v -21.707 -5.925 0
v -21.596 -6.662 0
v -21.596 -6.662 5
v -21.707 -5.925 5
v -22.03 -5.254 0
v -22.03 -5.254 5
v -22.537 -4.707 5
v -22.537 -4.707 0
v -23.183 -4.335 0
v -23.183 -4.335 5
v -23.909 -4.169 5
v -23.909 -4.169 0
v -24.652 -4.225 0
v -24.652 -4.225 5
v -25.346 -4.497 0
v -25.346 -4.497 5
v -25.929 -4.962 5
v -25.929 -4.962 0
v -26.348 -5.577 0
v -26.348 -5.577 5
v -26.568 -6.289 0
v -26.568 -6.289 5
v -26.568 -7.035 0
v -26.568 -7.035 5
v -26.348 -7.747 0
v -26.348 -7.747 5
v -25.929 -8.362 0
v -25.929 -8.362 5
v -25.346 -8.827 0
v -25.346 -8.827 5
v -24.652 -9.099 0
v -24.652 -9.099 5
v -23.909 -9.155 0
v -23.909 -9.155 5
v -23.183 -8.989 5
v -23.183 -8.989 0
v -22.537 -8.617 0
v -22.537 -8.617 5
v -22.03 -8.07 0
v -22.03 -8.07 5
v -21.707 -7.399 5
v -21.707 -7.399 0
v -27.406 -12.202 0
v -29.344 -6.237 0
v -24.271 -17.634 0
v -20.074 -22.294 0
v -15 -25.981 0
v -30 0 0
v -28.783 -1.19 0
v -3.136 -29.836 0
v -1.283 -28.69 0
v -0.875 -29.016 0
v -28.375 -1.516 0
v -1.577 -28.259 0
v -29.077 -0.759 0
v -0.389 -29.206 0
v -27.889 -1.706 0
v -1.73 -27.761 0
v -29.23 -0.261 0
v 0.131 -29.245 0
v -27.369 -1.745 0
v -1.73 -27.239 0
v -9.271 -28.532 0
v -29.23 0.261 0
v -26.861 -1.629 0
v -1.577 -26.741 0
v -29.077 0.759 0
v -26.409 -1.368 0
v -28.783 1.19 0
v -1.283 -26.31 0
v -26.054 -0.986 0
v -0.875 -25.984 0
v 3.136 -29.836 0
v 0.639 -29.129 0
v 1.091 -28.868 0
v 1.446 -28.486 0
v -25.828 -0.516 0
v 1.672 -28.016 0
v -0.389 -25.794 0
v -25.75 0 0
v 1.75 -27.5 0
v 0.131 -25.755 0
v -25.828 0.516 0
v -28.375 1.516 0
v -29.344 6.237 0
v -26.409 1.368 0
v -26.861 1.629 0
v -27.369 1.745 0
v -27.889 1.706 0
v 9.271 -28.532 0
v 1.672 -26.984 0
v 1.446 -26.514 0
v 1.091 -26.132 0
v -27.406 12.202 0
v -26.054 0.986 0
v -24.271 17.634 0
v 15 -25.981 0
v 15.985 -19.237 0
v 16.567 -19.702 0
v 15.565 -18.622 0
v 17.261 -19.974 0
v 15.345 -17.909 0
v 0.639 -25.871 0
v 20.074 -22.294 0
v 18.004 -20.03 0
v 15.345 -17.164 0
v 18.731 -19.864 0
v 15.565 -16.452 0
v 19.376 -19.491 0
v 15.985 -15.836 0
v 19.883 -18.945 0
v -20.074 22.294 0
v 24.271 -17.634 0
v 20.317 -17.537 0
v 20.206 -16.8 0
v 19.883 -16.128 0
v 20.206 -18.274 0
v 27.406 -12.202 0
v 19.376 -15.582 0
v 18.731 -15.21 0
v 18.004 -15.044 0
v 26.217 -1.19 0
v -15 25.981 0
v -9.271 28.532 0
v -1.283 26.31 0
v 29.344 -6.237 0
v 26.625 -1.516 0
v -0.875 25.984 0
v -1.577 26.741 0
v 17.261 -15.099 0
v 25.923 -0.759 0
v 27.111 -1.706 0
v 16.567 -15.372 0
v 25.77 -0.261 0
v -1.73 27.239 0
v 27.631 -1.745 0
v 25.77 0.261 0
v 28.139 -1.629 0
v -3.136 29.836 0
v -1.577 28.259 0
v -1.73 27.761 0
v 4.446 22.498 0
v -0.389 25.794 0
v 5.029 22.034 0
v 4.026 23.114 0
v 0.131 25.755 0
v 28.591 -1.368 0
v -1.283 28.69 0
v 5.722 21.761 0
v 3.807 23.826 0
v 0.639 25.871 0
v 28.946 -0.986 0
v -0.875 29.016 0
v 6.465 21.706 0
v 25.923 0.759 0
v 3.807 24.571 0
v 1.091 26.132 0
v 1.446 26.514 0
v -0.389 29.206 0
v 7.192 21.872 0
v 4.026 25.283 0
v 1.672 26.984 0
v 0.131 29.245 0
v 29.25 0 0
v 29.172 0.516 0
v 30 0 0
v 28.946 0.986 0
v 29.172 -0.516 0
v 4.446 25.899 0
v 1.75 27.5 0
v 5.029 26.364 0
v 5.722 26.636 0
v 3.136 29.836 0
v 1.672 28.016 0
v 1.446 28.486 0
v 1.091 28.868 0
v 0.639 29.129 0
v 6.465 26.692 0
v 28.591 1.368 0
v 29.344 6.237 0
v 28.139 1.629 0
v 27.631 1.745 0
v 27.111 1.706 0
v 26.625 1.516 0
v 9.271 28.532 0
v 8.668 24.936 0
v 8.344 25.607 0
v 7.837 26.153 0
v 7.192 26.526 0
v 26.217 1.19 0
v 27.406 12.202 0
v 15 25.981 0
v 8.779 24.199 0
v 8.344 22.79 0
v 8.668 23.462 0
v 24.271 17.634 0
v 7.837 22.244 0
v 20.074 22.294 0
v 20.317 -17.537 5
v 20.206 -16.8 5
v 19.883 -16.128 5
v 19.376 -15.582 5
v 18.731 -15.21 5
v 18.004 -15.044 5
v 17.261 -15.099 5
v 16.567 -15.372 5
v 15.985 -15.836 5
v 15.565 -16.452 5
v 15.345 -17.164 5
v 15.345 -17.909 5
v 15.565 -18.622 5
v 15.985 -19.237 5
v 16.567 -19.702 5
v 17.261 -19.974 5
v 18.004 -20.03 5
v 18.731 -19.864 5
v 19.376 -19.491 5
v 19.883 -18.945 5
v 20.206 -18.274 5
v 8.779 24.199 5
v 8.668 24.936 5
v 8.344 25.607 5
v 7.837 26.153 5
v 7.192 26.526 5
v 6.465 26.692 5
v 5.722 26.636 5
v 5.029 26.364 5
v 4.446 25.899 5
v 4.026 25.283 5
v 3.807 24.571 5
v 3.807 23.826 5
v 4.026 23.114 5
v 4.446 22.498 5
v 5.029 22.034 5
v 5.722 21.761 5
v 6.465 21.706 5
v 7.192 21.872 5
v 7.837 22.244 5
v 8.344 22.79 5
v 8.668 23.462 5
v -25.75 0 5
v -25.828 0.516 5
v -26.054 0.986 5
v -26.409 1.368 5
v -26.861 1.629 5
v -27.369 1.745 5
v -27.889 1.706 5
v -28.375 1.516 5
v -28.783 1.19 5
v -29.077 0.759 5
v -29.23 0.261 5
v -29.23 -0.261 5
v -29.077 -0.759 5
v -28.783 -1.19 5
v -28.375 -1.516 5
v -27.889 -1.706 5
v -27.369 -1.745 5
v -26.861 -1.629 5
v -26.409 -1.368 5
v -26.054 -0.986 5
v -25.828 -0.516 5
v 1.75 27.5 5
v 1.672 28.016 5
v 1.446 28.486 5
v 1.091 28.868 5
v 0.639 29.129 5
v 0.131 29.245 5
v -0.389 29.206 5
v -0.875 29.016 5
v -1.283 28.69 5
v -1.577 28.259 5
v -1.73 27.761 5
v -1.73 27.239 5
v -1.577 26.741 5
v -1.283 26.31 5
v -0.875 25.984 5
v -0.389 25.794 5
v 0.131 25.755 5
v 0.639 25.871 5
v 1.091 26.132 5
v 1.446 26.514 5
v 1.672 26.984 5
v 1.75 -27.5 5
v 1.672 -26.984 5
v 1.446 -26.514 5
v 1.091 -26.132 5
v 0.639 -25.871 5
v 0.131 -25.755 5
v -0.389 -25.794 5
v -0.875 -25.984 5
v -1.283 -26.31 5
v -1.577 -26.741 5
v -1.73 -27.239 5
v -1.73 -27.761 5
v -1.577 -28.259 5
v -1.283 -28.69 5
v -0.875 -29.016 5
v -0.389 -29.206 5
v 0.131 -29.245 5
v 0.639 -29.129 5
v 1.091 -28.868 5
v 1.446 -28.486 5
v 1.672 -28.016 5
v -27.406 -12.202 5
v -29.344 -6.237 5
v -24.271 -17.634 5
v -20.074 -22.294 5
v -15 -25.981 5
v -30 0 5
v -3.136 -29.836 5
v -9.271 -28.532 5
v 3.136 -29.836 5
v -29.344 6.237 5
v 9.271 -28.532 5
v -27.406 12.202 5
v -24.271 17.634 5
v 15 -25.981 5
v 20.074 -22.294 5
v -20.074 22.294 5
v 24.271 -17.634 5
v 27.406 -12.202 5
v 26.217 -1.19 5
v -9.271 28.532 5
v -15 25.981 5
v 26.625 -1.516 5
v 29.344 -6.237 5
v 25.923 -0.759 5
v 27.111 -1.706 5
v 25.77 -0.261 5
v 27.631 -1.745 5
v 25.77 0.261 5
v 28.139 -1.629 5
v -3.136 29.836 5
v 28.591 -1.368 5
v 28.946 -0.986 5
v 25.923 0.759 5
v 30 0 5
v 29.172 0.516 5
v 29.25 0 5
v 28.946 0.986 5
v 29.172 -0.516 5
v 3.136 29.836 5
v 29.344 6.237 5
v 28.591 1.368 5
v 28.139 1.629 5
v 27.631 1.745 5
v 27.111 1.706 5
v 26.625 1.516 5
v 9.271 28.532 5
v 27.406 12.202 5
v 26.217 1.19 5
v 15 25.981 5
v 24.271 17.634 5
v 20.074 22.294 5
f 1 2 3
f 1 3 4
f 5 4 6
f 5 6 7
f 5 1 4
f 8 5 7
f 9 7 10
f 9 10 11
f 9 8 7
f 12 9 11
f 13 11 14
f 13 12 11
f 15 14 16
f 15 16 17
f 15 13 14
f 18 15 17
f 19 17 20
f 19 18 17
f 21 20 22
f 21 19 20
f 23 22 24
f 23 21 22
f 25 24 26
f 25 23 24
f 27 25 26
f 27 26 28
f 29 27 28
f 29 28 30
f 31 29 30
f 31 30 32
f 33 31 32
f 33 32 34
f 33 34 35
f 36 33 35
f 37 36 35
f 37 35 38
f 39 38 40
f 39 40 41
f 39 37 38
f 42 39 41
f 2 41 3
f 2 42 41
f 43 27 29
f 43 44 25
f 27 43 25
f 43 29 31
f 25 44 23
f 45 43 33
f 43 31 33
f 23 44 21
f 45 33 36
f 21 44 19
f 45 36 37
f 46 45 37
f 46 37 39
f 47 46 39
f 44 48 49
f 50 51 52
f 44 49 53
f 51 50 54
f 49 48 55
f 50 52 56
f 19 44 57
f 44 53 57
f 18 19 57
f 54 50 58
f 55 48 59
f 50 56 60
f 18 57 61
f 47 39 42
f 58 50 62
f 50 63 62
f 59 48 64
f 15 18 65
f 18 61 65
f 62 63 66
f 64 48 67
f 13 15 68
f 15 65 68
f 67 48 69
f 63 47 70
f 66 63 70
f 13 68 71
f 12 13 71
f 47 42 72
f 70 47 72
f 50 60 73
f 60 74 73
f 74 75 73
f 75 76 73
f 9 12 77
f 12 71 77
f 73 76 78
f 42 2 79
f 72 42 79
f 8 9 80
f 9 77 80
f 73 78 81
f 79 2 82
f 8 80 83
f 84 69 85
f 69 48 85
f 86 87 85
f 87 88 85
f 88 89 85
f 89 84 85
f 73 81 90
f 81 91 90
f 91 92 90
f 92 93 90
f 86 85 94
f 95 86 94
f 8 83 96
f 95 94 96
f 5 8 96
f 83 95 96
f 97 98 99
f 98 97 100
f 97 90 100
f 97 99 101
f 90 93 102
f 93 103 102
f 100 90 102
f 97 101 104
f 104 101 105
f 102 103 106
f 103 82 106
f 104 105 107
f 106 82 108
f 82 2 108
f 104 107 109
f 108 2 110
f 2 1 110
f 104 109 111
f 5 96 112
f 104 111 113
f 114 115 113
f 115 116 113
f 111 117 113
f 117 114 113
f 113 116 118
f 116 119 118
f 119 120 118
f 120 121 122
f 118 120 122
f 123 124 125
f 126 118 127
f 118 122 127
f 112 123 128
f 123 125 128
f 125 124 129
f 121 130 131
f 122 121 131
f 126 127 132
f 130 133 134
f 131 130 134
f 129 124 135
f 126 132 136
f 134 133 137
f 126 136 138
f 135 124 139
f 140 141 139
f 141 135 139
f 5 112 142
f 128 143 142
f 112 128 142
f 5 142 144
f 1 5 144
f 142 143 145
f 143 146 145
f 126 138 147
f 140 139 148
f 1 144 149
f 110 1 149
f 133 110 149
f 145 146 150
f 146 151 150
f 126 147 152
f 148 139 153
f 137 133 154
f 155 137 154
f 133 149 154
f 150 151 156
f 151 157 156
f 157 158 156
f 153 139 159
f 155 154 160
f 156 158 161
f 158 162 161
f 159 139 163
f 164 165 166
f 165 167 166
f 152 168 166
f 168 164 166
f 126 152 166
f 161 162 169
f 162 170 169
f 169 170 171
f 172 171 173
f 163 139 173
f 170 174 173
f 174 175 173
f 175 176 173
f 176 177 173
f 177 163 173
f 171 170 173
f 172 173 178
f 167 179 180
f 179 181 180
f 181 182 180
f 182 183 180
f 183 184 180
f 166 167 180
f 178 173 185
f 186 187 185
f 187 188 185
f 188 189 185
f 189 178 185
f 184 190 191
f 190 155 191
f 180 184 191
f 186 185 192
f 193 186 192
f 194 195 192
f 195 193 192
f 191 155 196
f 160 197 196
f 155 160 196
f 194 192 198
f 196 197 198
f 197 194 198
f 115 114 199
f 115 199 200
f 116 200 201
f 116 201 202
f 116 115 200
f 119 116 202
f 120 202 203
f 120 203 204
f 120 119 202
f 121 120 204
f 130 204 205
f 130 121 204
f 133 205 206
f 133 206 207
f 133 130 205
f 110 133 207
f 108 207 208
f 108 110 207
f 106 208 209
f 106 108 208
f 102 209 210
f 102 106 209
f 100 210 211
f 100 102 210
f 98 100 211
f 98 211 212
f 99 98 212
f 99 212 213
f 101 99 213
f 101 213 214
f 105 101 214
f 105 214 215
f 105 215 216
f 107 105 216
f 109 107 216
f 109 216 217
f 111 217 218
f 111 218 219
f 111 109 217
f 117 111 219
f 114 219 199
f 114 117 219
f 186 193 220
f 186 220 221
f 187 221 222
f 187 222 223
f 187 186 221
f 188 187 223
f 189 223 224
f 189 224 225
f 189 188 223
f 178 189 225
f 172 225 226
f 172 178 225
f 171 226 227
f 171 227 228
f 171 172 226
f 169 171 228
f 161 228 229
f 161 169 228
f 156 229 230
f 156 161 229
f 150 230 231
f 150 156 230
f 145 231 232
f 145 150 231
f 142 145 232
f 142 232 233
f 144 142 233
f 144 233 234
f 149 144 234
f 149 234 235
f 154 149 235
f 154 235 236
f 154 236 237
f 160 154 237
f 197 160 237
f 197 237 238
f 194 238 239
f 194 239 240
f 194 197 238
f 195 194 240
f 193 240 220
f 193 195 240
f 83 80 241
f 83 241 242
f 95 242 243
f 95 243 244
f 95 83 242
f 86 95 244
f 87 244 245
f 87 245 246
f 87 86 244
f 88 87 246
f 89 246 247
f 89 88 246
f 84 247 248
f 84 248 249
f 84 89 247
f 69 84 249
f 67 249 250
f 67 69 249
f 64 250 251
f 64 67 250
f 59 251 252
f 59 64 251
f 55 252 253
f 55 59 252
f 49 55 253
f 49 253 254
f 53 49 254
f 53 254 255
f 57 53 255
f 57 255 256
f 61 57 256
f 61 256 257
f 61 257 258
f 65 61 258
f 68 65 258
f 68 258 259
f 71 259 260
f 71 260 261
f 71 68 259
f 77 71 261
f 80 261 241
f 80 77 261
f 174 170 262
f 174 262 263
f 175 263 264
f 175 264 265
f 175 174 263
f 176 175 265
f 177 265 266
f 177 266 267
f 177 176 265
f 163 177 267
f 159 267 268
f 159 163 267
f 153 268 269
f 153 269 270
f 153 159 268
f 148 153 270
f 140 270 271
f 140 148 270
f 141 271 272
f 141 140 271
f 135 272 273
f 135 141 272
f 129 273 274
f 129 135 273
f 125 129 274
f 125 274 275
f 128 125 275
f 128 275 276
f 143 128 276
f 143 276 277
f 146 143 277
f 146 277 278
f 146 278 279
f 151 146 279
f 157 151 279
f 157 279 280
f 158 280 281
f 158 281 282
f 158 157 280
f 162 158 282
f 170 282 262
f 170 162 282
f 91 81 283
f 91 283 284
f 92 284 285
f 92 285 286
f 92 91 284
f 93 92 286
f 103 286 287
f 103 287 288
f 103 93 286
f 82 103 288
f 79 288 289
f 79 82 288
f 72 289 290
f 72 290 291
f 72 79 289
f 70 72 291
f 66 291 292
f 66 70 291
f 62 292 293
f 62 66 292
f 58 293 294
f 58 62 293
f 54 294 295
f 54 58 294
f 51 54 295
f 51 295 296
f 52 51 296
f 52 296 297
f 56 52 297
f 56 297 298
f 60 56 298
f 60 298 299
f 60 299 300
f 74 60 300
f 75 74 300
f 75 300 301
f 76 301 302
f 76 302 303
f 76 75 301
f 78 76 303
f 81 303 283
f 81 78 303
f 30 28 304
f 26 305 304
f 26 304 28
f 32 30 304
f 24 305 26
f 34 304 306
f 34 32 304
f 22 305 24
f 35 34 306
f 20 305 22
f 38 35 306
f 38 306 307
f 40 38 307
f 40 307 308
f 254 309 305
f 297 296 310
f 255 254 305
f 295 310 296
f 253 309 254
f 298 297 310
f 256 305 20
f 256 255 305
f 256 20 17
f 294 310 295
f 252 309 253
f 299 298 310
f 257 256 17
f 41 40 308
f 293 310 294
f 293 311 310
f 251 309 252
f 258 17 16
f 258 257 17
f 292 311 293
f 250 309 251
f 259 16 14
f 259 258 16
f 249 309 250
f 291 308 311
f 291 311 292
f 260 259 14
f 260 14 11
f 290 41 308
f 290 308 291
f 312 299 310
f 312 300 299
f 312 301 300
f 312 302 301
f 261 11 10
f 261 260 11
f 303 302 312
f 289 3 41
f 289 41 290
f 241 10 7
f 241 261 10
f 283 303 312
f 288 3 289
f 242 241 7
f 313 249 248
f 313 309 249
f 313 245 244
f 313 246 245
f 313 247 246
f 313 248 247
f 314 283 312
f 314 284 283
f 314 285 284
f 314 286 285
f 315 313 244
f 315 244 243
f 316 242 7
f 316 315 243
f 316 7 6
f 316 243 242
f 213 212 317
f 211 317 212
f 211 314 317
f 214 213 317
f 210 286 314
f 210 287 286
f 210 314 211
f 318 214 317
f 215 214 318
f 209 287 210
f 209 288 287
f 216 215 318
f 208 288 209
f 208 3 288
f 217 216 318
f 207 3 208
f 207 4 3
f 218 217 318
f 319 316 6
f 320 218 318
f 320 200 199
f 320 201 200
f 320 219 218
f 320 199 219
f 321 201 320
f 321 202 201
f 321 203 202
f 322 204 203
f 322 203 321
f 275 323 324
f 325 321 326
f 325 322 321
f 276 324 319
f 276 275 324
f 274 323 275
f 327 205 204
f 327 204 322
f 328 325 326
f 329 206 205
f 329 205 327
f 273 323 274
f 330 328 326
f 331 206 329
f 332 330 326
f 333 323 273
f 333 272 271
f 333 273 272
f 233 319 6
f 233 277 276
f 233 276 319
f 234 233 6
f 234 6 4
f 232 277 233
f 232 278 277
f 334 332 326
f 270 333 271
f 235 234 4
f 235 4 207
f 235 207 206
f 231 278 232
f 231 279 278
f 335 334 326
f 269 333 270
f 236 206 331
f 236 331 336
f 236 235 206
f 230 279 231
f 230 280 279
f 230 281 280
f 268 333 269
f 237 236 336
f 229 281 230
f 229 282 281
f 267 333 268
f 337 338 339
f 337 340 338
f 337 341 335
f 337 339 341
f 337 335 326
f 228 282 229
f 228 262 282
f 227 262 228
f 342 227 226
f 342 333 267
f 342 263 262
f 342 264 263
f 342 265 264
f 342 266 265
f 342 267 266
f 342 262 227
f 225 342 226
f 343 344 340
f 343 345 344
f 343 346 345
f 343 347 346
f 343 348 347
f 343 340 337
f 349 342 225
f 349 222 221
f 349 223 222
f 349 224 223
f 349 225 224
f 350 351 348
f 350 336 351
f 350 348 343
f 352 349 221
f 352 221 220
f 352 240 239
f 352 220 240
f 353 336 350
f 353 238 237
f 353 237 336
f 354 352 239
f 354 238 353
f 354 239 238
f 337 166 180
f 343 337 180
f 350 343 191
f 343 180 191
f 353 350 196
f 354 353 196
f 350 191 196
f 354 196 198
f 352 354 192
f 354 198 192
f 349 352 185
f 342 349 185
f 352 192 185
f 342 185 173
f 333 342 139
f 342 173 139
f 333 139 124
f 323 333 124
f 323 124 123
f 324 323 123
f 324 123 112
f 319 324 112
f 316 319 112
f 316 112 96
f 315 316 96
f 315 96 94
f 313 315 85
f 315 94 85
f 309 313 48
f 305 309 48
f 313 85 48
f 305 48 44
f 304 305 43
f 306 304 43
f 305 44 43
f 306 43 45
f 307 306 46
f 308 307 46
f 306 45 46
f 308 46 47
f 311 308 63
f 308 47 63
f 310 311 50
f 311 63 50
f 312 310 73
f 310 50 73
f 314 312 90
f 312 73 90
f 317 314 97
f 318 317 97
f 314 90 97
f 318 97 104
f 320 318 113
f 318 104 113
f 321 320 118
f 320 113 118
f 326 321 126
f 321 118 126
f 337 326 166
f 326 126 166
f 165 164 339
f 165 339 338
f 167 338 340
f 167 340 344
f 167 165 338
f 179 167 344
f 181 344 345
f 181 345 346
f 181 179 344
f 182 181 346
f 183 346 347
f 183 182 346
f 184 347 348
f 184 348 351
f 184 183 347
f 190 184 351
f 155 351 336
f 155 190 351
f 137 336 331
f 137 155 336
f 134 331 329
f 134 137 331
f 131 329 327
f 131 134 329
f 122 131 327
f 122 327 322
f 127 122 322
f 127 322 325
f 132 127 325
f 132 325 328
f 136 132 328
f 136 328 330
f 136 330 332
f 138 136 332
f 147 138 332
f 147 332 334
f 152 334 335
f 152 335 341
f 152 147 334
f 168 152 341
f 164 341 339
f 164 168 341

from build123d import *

# Parameters (mm, degrees)
SKETCH1_R           = 30
SKETCH1_R_2         = 1.75
SKETCH1_R_3         = 2.5
BOSS_EXTRUDE1_DEPTH = 5


with BuildPart() as part:
    # Sketch1 → Boss-Extrude1 (new body)
    with BuildSketch(Plane.XY):
        Circle(SKETCH1_R)
        with Locations((0, 27.5)):
            Circle(SKETCH1_R_2, mode=Mode.SUBTRACT)
        with Locations((27.5, 0)):
            Circle(SKETCH1_R_2, mode=Mode.SUBTRACT)
        with Locations((0, -27.5)):
            Circle(SKETCH1_R_2, mode=Mode.SUBTRACT)
        with Locations((-27.5, 0)):
            Circle(SKETCH1_R_2, mode=Mode.SUBTRACT)
        with Locations((6.278593331, 24.198745128)):
            Circle(SKETCH1_R_3, mode=Mode.SUBTRACT)
        with Locations((17.817431356, -17.536793889)):
            Circle(SKETCH1_R_3, mode=Mode.SUBTRACT)
        with Locations((-24.096024686, -6.66195124)):
            Circle(SKETCH1_R_3, mode=Mode.SUBTRACT)
    extrude(amount=BOSS_EXTRUDE1_DEPTH)


solid = part.part
